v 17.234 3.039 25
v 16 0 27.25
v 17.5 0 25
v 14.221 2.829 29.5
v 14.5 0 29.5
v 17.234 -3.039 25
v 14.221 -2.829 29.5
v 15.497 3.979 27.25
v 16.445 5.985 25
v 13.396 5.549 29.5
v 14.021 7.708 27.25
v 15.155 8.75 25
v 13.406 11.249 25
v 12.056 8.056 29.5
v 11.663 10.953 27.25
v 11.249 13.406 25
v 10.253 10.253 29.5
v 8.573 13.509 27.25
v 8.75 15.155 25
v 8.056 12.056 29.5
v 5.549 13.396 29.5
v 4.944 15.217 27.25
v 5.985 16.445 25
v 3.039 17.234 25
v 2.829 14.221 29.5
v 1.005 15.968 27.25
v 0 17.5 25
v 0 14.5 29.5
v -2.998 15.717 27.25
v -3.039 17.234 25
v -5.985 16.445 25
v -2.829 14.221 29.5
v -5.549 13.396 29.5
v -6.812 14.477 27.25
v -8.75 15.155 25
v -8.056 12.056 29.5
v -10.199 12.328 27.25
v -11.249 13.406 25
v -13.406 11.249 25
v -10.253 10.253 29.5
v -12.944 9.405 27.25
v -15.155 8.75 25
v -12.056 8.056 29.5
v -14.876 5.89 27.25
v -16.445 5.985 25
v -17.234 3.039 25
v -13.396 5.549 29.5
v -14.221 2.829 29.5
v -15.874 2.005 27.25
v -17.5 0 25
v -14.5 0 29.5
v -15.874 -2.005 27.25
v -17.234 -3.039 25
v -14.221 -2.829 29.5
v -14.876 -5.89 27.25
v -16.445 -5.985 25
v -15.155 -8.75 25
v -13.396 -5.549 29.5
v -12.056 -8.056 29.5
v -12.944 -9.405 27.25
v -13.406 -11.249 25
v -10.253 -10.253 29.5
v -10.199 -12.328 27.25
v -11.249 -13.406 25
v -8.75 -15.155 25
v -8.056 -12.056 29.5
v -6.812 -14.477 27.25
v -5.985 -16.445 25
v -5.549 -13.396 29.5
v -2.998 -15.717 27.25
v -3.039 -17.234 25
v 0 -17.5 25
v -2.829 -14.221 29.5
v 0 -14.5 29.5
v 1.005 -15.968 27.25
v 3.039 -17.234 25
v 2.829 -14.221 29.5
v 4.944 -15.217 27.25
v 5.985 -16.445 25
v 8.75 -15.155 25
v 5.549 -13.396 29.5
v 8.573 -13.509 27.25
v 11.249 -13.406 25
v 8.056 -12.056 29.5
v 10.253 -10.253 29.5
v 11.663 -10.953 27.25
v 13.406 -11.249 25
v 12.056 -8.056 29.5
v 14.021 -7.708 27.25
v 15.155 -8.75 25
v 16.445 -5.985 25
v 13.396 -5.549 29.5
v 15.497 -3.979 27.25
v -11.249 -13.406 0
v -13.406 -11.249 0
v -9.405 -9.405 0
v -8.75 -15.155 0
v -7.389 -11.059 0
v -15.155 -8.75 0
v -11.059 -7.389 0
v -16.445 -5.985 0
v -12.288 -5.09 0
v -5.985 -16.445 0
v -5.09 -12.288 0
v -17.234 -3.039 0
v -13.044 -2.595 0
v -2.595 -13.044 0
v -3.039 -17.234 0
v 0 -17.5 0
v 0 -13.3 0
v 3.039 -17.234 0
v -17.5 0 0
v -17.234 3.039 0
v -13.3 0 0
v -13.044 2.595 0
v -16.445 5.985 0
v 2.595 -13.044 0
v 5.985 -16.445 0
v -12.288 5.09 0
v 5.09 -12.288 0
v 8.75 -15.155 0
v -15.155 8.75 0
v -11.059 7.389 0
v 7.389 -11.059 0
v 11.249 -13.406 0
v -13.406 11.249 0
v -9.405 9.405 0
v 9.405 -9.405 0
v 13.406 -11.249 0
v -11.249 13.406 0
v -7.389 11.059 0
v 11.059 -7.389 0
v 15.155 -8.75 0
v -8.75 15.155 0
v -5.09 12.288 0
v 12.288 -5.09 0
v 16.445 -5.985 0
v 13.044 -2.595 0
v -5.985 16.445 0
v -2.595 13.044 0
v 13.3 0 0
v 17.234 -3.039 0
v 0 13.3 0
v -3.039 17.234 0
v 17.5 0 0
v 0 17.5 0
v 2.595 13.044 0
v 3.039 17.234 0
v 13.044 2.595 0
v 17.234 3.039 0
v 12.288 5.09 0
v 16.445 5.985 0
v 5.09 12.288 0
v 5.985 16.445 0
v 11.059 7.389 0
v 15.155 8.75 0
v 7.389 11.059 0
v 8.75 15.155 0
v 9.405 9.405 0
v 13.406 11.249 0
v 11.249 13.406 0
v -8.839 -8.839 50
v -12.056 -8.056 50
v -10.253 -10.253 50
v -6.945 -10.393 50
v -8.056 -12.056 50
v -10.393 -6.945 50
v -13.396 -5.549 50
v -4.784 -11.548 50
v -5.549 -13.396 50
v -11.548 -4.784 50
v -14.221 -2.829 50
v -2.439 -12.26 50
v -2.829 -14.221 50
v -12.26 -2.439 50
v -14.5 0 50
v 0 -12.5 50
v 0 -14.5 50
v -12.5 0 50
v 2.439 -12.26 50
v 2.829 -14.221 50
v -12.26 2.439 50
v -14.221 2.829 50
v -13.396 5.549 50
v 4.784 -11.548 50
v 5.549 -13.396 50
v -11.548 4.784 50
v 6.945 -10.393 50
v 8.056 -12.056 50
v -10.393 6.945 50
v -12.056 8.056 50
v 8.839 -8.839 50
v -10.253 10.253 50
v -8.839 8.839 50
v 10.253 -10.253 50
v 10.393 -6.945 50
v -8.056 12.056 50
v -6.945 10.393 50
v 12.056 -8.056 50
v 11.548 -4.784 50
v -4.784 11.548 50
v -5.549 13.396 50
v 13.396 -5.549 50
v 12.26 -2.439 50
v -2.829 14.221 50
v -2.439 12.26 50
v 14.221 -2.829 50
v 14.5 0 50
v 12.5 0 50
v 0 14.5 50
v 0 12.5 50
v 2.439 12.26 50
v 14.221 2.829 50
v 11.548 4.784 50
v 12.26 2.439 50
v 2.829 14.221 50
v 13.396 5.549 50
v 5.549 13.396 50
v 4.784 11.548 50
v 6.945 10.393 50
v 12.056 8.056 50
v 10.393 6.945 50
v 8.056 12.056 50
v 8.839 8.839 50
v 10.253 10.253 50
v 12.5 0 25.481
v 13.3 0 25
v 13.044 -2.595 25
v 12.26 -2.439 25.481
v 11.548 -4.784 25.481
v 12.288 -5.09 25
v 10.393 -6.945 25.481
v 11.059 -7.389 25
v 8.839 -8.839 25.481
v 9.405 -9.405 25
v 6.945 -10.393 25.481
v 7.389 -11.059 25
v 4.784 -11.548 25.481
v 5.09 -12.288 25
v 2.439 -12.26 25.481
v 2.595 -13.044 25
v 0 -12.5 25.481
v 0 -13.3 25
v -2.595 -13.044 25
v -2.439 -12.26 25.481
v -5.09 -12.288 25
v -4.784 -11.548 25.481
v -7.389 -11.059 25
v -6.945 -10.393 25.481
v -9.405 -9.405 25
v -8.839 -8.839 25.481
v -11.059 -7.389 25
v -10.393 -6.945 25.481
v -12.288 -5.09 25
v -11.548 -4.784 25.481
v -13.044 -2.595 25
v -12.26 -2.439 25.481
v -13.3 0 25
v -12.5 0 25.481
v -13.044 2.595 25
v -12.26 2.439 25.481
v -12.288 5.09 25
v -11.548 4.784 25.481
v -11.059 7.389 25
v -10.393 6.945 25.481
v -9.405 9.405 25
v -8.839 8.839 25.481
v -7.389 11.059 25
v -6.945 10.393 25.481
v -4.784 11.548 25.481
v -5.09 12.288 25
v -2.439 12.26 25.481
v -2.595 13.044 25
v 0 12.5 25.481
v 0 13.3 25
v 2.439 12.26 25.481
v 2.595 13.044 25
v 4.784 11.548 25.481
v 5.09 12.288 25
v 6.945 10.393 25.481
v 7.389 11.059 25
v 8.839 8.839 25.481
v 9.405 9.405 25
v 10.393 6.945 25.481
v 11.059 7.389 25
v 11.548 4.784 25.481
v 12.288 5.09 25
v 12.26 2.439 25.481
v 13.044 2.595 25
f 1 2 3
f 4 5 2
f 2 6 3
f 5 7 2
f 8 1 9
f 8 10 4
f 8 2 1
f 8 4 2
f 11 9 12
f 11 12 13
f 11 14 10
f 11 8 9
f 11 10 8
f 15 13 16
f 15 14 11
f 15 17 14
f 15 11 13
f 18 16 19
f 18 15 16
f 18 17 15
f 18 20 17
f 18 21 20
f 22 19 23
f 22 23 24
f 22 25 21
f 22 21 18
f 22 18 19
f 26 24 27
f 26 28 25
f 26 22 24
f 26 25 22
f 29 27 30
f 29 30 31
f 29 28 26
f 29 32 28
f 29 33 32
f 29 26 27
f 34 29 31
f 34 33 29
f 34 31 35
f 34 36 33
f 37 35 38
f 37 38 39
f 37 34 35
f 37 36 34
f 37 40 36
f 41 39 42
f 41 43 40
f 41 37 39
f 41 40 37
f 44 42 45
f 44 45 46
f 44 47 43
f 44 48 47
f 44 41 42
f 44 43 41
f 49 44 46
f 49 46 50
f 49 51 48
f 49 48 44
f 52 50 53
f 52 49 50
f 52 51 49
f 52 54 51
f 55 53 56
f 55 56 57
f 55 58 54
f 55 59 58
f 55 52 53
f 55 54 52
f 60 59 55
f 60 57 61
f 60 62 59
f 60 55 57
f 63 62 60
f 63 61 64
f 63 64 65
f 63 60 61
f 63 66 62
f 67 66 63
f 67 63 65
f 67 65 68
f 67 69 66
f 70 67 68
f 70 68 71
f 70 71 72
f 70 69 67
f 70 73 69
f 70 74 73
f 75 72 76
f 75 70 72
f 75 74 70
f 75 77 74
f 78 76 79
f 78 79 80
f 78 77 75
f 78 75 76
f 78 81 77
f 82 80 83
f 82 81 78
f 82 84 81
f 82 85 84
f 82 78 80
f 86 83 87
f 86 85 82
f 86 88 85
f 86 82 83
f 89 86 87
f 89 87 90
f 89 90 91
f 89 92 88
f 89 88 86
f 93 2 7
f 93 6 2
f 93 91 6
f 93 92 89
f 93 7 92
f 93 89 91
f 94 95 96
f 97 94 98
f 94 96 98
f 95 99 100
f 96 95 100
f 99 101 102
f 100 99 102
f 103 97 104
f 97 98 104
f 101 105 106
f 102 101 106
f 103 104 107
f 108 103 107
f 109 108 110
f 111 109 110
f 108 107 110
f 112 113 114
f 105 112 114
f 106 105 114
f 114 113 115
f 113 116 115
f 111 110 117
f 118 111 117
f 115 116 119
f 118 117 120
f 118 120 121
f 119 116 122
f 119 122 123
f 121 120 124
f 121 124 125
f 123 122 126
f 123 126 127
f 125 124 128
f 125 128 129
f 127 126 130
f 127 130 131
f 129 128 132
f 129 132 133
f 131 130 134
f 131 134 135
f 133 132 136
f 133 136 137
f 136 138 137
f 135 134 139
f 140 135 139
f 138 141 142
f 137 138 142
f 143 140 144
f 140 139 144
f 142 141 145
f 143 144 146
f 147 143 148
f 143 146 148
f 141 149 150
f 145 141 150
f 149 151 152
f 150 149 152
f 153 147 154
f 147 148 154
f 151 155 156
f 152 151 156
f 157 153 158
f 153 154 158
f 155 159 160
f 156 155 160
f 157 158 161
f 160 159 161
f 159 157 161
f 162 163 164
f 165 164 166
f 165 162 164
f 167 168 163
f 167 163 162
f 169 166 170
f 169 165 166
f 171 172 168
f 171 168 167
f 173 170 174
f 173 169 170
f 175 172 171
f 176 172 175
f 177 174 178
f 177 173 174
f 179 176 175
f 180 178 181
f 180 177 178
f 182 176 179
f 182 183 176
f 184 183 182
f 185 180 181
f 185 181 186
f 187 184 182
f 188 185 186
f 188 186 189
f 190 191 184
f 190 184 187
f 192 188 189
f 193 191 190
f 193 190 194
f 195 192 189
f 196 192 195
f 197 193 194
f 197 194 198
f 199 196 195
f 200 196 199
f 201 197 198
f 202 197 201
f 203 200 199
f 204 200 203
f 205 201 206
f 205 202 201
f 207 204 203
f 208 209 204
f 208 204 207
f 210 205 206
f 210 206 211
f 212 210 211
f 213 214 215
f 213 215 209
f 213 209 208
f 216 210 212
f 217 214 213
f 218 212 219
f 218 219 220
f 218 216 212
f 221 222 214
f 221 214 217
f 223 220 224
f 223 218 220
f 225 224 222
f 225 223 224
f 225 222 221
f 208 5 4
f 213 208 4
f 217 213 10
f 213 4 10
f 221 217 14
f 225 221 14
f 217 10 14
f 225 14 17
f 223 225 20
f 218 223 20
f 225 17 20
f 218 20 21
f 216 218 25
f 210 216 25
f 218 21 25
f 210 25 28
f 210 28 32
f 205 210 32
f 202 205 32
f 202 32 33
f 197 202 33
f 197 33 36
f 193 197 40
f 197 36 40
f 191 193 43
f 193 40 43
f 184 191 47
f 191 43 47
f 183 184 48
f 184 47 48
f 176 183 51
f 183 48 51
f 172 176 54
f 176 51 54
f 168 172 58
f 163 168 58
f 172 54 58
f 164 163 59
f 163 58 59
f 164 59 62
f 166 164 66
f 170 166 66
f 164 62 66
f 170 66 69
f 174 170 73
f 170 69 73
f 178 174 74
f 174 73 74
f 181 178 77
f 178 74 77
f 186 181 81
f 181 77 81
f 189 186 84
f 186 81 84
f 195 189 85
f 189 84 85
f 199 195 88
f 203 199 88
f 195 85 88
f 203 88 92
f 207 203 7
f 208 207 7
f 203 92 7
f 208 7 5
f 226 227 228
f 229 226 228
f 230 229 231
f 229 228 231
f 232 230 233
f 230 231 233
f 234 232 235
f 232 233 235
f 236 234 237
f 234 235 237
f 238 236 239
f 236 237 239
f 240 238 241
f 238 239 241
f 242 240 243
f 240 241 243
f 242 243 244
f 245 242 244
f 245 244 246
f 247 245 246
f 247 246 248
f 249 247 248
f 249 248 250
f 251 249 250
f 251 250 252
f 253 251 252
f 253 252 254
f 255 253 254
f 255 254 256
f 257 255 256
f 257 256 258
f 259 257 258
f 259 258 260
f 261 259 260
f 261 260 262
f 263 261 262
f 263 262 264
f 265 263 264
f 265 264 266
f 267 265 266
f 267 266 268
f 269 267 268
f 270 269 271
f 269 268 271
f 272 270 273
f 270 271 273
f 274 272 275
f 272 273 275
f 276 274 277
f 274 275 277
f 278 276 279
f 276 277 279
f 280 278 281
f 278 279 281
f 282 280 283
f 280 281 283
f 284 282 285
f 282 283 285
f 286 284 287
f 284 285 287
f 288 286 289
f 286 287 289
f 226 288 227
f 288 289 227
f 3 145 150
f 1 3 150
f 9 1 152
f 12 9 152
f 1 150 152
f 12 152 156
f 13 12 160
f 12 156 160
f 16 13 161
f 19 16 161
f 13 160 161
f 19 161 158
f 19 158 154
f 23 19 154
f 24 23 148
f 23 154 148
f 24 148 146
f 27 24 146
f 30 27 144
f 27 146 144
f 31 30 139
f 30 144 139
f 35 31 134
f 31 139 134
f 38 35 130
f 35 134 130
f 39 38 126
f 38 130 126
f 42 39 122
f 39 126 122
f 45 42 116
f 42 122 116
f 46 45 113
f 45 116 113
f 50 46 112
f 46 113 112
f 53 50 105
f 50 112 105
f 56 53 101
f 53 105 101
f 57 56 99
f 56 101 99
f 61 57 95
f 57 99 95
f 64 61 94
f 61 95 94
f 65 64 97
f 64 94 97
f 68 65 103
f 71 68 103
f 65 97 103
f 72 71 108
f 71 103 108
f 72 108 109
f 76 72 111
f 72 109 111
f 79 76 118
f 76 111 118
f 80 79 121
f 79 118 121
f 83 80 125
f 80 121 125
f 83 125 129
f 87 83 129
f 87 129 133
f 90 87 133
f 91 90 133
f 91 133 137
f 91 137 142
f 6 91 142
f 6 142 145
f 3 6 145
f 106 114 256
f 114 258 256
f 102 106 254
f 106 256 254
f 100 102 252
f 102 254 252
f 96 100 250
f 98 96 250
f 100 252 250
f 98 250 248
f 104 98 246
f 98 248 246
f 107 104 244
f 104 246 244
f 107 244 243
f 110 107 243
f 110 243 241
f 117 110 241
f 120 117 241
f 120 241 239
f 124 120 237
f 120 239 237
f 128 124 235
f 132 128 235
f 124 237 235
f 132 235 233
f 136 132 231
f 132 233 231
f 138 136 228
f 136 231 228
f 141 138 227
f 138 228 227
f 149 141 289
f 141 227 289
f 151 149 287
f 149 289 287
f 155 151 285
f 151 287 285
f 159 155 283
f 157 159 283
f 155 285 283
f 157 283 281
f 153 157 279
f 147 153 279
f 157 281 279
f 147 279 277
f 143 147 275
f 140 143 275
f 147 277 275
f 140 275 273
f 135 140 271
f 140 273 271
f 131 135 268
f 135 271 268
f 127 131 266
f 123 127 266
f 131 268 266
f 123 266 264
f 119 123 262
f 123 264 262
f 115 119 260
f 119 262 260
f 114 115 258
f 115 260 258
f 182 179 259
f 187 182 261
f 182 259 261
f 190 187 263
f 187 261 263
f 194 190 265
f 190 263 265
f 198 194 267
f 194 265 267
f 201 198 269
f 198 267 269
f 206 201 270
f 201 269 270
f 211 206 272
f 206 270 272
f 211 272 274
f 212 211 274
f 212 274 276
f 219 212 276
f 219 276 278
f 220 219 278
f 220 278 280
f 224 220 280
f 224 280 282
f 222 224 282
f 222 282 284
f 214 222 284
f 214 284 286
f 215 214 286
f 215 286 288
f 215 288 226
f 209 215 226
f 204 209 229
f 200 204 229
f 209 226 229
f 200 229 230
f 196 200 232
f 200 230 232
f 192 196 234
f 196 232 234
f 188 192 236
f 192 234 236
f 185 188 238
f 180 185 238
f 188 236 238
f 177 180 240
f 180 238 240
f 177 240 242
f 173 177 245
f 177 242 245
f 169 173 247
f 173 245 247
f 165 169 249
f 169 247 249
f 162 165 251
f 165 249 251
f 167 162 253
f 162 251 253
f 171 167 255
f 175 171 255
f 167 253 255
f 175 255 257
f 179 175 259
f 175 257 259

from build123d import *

# Parameters (mm, degrees)
F0_R      = 17.5
F1_DEPTH  = 25
F3_R      = 14.5
F4_DEPTH  = 20.5
F1_FACE_R = 17.5
F4_FACE_R = 14.5
F7_D      = 25
F9_D      = 26.6
F9_DEPTH  = 25
F9_TIP    = 7.9914462331


with BuildPart() as f1:
    # F0 (on Top) → F1 (new body)
    with BuildSketch(Plane.XY):
        Circle(F0_R)
    extrude(amount=F1_DEPTH)



with BuildPart() as f4:
    # F3 (on offset) → F4 (new body)
    with BuildSketch(Plane.XY.offset(29.5)):
        Circle(F3_R)
    extrude(amount=F4_DEPTH)


with BuildPart() as f1_1:
    add(f1.part)

    add(f4.part)  # F5 merges F4
    # F1_face (on face) → F5 section 0
    with BuildSketch(Plane.XY.offset(25)):
        Circle(F1_FACE_R)
    # F4_face (on face) → F5 section 1
    with BuildSketch(Plane(origin=(0, 0, 29.5), x_dir=(1, 0, 0), z_dir=(0, 0, -1))):
        Circle(F4_FACE_R)
    loft()

    # F7 (through all)
    with Locations(Plane.XY.offset(50)):
        with Locations((0, 0)):
            Hole(F7_D / 2)

    # F9
    with Locations(Plane(origin=(0, 0, 0), x_dir=(1, 0, 0), z_dir=(0, 0, -1))):
        with Locations((0, 0)):
            Hole(F9_D / 2, depth=F9_DEPTH)
            with Locations((0, 0, -(F9_DEPTH + F9_TIP / 2))):  # 118° drill point
                Cone(0, F9_D / 2, F9_TIP, mode=Mode.SUBTRACT)


solid = f1_1.part
